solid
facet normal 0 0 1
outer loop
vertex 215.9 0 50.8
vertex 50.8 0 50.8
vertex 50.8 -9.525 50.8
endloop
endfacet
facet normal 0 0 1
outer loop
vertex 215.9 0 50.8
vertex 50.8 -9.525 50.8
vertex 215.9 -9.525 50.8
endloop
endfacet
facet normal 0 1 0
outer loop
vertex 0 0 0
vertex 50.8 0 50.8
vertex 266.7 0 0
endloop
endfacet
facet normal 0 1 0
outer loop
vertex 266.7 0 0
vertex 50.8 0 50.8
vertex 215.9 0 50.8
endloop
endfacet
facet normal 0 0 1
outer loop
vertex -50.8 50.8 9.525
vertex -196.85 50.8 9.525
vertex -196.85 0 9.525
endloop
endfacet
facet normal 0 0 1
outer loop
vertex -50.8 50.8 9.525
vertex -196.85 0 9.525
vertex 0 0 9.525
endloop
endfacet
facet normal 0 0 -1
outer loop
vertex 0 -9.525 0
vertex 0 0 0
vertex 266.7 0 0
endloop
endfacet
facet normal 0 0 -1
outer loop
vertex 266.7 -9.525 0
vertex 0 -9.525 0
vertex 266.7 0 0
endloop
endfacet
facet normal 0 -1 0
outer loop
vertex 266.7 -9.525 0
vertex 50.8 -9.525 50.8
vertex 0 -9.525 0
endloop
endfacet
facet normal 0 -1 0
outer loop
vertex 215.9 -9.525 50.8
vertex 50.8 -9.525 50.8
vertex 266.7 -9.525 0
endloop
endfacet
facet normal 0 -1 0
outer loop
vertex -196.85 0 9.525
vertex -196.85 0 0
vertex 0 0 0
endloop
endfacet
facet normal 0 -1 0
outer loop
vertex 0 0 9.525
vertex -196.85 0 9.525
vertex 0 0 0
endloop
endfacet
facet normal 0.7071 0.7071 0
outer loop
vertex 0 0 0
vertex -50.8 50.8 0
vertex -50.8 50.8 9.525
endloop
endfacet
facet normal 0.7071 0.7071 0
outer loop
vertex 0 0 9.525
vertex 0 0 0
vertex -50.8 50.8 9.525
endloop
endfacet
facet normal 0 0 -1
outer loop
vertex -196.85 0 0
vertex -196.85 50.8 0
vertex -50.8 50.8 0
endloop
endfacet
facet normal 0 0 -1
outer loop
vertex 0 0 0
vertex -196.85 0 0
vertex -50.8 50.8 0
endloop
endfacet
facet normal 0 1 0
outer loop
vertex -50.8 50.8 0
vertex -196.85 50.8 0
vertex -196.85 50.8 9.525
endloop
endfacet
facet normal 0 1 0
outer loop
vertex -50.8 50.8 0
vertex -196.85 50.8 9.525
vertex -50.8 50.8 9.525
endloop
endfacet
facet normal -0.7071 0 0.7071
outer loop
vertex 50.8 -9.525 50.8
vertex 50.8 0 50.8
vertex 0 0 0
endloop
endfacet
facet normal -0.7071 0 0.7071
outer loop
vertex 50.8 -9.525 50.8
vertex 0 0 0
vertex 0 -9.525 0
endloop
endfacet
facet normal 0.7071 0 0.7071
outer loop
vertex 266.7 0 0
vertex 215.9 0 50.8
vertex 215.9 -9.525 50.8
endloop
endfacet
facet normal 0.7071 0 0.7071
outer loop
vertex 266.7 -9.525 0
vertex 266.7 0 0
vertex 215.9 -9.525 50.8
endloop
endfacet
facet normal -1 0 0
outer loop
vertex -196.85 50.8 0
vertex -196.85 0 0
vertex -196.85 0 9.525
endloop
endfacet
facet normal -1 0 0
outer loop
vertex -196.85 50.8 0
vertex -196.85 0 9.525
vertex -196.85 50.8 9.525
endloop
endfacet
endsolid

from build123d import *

# Parameters (mm, degrees)
F0_W     = 266.7
F0_H     = 50.8
F1_DEPTH = 9.525
F2_SIZE  = 50.79999
F3_W     = 196.85
F3_H     = 50.8
F4_DEPTH = 9.525
F5_SIZE  = 50.79999


# Not quite as in the source:
# - a fillet or chamfer is up to 0.001 mm smaller than in the source, because OpenCascade refuses the exact size


with BuildPart() as f1:
    # F0 (on Front) → F1 (new body)
    with BuildSketch(Plane.XZ):
        with Locations((133.35, 25.4)):
            Rectangle(F0_W, F0_H)
    extrude(amount=F1_DEPTH)

    # F2 (size 50.8 in the source; OpenCascade refuses exactly that, so slightly less here)
    f2_edges = [f1.edges().sort_by_distance(p)[0] for p in [
        (266.7, -4.7625, 50.8),
        (0, -4.7625, 50.8),
    ]]
    chamfer(f2_edges, length=F2_SIZE)


with BuildPart() as f4:
    # F3 (on Top) → F4 (new body)
    with BuildSketch(Plane.XY):
        with Locations((-98.425, 25.4)):
            Rectangle(F3_W, F3_H)
    extrude(amount=F4_DEPTH)

    # F5 (size 50.8 in the source; OpenCascade refuses exactly that, so slightly less here)
    f5_edges = [f4.edges().sort_by_distance(p)[0] for p in [
        (0, 50.8, 4.7625),
    ]]
    chamfer(f5_edges, length=F5_SIZE)


solid = Compound([f1.part, f4.part])
